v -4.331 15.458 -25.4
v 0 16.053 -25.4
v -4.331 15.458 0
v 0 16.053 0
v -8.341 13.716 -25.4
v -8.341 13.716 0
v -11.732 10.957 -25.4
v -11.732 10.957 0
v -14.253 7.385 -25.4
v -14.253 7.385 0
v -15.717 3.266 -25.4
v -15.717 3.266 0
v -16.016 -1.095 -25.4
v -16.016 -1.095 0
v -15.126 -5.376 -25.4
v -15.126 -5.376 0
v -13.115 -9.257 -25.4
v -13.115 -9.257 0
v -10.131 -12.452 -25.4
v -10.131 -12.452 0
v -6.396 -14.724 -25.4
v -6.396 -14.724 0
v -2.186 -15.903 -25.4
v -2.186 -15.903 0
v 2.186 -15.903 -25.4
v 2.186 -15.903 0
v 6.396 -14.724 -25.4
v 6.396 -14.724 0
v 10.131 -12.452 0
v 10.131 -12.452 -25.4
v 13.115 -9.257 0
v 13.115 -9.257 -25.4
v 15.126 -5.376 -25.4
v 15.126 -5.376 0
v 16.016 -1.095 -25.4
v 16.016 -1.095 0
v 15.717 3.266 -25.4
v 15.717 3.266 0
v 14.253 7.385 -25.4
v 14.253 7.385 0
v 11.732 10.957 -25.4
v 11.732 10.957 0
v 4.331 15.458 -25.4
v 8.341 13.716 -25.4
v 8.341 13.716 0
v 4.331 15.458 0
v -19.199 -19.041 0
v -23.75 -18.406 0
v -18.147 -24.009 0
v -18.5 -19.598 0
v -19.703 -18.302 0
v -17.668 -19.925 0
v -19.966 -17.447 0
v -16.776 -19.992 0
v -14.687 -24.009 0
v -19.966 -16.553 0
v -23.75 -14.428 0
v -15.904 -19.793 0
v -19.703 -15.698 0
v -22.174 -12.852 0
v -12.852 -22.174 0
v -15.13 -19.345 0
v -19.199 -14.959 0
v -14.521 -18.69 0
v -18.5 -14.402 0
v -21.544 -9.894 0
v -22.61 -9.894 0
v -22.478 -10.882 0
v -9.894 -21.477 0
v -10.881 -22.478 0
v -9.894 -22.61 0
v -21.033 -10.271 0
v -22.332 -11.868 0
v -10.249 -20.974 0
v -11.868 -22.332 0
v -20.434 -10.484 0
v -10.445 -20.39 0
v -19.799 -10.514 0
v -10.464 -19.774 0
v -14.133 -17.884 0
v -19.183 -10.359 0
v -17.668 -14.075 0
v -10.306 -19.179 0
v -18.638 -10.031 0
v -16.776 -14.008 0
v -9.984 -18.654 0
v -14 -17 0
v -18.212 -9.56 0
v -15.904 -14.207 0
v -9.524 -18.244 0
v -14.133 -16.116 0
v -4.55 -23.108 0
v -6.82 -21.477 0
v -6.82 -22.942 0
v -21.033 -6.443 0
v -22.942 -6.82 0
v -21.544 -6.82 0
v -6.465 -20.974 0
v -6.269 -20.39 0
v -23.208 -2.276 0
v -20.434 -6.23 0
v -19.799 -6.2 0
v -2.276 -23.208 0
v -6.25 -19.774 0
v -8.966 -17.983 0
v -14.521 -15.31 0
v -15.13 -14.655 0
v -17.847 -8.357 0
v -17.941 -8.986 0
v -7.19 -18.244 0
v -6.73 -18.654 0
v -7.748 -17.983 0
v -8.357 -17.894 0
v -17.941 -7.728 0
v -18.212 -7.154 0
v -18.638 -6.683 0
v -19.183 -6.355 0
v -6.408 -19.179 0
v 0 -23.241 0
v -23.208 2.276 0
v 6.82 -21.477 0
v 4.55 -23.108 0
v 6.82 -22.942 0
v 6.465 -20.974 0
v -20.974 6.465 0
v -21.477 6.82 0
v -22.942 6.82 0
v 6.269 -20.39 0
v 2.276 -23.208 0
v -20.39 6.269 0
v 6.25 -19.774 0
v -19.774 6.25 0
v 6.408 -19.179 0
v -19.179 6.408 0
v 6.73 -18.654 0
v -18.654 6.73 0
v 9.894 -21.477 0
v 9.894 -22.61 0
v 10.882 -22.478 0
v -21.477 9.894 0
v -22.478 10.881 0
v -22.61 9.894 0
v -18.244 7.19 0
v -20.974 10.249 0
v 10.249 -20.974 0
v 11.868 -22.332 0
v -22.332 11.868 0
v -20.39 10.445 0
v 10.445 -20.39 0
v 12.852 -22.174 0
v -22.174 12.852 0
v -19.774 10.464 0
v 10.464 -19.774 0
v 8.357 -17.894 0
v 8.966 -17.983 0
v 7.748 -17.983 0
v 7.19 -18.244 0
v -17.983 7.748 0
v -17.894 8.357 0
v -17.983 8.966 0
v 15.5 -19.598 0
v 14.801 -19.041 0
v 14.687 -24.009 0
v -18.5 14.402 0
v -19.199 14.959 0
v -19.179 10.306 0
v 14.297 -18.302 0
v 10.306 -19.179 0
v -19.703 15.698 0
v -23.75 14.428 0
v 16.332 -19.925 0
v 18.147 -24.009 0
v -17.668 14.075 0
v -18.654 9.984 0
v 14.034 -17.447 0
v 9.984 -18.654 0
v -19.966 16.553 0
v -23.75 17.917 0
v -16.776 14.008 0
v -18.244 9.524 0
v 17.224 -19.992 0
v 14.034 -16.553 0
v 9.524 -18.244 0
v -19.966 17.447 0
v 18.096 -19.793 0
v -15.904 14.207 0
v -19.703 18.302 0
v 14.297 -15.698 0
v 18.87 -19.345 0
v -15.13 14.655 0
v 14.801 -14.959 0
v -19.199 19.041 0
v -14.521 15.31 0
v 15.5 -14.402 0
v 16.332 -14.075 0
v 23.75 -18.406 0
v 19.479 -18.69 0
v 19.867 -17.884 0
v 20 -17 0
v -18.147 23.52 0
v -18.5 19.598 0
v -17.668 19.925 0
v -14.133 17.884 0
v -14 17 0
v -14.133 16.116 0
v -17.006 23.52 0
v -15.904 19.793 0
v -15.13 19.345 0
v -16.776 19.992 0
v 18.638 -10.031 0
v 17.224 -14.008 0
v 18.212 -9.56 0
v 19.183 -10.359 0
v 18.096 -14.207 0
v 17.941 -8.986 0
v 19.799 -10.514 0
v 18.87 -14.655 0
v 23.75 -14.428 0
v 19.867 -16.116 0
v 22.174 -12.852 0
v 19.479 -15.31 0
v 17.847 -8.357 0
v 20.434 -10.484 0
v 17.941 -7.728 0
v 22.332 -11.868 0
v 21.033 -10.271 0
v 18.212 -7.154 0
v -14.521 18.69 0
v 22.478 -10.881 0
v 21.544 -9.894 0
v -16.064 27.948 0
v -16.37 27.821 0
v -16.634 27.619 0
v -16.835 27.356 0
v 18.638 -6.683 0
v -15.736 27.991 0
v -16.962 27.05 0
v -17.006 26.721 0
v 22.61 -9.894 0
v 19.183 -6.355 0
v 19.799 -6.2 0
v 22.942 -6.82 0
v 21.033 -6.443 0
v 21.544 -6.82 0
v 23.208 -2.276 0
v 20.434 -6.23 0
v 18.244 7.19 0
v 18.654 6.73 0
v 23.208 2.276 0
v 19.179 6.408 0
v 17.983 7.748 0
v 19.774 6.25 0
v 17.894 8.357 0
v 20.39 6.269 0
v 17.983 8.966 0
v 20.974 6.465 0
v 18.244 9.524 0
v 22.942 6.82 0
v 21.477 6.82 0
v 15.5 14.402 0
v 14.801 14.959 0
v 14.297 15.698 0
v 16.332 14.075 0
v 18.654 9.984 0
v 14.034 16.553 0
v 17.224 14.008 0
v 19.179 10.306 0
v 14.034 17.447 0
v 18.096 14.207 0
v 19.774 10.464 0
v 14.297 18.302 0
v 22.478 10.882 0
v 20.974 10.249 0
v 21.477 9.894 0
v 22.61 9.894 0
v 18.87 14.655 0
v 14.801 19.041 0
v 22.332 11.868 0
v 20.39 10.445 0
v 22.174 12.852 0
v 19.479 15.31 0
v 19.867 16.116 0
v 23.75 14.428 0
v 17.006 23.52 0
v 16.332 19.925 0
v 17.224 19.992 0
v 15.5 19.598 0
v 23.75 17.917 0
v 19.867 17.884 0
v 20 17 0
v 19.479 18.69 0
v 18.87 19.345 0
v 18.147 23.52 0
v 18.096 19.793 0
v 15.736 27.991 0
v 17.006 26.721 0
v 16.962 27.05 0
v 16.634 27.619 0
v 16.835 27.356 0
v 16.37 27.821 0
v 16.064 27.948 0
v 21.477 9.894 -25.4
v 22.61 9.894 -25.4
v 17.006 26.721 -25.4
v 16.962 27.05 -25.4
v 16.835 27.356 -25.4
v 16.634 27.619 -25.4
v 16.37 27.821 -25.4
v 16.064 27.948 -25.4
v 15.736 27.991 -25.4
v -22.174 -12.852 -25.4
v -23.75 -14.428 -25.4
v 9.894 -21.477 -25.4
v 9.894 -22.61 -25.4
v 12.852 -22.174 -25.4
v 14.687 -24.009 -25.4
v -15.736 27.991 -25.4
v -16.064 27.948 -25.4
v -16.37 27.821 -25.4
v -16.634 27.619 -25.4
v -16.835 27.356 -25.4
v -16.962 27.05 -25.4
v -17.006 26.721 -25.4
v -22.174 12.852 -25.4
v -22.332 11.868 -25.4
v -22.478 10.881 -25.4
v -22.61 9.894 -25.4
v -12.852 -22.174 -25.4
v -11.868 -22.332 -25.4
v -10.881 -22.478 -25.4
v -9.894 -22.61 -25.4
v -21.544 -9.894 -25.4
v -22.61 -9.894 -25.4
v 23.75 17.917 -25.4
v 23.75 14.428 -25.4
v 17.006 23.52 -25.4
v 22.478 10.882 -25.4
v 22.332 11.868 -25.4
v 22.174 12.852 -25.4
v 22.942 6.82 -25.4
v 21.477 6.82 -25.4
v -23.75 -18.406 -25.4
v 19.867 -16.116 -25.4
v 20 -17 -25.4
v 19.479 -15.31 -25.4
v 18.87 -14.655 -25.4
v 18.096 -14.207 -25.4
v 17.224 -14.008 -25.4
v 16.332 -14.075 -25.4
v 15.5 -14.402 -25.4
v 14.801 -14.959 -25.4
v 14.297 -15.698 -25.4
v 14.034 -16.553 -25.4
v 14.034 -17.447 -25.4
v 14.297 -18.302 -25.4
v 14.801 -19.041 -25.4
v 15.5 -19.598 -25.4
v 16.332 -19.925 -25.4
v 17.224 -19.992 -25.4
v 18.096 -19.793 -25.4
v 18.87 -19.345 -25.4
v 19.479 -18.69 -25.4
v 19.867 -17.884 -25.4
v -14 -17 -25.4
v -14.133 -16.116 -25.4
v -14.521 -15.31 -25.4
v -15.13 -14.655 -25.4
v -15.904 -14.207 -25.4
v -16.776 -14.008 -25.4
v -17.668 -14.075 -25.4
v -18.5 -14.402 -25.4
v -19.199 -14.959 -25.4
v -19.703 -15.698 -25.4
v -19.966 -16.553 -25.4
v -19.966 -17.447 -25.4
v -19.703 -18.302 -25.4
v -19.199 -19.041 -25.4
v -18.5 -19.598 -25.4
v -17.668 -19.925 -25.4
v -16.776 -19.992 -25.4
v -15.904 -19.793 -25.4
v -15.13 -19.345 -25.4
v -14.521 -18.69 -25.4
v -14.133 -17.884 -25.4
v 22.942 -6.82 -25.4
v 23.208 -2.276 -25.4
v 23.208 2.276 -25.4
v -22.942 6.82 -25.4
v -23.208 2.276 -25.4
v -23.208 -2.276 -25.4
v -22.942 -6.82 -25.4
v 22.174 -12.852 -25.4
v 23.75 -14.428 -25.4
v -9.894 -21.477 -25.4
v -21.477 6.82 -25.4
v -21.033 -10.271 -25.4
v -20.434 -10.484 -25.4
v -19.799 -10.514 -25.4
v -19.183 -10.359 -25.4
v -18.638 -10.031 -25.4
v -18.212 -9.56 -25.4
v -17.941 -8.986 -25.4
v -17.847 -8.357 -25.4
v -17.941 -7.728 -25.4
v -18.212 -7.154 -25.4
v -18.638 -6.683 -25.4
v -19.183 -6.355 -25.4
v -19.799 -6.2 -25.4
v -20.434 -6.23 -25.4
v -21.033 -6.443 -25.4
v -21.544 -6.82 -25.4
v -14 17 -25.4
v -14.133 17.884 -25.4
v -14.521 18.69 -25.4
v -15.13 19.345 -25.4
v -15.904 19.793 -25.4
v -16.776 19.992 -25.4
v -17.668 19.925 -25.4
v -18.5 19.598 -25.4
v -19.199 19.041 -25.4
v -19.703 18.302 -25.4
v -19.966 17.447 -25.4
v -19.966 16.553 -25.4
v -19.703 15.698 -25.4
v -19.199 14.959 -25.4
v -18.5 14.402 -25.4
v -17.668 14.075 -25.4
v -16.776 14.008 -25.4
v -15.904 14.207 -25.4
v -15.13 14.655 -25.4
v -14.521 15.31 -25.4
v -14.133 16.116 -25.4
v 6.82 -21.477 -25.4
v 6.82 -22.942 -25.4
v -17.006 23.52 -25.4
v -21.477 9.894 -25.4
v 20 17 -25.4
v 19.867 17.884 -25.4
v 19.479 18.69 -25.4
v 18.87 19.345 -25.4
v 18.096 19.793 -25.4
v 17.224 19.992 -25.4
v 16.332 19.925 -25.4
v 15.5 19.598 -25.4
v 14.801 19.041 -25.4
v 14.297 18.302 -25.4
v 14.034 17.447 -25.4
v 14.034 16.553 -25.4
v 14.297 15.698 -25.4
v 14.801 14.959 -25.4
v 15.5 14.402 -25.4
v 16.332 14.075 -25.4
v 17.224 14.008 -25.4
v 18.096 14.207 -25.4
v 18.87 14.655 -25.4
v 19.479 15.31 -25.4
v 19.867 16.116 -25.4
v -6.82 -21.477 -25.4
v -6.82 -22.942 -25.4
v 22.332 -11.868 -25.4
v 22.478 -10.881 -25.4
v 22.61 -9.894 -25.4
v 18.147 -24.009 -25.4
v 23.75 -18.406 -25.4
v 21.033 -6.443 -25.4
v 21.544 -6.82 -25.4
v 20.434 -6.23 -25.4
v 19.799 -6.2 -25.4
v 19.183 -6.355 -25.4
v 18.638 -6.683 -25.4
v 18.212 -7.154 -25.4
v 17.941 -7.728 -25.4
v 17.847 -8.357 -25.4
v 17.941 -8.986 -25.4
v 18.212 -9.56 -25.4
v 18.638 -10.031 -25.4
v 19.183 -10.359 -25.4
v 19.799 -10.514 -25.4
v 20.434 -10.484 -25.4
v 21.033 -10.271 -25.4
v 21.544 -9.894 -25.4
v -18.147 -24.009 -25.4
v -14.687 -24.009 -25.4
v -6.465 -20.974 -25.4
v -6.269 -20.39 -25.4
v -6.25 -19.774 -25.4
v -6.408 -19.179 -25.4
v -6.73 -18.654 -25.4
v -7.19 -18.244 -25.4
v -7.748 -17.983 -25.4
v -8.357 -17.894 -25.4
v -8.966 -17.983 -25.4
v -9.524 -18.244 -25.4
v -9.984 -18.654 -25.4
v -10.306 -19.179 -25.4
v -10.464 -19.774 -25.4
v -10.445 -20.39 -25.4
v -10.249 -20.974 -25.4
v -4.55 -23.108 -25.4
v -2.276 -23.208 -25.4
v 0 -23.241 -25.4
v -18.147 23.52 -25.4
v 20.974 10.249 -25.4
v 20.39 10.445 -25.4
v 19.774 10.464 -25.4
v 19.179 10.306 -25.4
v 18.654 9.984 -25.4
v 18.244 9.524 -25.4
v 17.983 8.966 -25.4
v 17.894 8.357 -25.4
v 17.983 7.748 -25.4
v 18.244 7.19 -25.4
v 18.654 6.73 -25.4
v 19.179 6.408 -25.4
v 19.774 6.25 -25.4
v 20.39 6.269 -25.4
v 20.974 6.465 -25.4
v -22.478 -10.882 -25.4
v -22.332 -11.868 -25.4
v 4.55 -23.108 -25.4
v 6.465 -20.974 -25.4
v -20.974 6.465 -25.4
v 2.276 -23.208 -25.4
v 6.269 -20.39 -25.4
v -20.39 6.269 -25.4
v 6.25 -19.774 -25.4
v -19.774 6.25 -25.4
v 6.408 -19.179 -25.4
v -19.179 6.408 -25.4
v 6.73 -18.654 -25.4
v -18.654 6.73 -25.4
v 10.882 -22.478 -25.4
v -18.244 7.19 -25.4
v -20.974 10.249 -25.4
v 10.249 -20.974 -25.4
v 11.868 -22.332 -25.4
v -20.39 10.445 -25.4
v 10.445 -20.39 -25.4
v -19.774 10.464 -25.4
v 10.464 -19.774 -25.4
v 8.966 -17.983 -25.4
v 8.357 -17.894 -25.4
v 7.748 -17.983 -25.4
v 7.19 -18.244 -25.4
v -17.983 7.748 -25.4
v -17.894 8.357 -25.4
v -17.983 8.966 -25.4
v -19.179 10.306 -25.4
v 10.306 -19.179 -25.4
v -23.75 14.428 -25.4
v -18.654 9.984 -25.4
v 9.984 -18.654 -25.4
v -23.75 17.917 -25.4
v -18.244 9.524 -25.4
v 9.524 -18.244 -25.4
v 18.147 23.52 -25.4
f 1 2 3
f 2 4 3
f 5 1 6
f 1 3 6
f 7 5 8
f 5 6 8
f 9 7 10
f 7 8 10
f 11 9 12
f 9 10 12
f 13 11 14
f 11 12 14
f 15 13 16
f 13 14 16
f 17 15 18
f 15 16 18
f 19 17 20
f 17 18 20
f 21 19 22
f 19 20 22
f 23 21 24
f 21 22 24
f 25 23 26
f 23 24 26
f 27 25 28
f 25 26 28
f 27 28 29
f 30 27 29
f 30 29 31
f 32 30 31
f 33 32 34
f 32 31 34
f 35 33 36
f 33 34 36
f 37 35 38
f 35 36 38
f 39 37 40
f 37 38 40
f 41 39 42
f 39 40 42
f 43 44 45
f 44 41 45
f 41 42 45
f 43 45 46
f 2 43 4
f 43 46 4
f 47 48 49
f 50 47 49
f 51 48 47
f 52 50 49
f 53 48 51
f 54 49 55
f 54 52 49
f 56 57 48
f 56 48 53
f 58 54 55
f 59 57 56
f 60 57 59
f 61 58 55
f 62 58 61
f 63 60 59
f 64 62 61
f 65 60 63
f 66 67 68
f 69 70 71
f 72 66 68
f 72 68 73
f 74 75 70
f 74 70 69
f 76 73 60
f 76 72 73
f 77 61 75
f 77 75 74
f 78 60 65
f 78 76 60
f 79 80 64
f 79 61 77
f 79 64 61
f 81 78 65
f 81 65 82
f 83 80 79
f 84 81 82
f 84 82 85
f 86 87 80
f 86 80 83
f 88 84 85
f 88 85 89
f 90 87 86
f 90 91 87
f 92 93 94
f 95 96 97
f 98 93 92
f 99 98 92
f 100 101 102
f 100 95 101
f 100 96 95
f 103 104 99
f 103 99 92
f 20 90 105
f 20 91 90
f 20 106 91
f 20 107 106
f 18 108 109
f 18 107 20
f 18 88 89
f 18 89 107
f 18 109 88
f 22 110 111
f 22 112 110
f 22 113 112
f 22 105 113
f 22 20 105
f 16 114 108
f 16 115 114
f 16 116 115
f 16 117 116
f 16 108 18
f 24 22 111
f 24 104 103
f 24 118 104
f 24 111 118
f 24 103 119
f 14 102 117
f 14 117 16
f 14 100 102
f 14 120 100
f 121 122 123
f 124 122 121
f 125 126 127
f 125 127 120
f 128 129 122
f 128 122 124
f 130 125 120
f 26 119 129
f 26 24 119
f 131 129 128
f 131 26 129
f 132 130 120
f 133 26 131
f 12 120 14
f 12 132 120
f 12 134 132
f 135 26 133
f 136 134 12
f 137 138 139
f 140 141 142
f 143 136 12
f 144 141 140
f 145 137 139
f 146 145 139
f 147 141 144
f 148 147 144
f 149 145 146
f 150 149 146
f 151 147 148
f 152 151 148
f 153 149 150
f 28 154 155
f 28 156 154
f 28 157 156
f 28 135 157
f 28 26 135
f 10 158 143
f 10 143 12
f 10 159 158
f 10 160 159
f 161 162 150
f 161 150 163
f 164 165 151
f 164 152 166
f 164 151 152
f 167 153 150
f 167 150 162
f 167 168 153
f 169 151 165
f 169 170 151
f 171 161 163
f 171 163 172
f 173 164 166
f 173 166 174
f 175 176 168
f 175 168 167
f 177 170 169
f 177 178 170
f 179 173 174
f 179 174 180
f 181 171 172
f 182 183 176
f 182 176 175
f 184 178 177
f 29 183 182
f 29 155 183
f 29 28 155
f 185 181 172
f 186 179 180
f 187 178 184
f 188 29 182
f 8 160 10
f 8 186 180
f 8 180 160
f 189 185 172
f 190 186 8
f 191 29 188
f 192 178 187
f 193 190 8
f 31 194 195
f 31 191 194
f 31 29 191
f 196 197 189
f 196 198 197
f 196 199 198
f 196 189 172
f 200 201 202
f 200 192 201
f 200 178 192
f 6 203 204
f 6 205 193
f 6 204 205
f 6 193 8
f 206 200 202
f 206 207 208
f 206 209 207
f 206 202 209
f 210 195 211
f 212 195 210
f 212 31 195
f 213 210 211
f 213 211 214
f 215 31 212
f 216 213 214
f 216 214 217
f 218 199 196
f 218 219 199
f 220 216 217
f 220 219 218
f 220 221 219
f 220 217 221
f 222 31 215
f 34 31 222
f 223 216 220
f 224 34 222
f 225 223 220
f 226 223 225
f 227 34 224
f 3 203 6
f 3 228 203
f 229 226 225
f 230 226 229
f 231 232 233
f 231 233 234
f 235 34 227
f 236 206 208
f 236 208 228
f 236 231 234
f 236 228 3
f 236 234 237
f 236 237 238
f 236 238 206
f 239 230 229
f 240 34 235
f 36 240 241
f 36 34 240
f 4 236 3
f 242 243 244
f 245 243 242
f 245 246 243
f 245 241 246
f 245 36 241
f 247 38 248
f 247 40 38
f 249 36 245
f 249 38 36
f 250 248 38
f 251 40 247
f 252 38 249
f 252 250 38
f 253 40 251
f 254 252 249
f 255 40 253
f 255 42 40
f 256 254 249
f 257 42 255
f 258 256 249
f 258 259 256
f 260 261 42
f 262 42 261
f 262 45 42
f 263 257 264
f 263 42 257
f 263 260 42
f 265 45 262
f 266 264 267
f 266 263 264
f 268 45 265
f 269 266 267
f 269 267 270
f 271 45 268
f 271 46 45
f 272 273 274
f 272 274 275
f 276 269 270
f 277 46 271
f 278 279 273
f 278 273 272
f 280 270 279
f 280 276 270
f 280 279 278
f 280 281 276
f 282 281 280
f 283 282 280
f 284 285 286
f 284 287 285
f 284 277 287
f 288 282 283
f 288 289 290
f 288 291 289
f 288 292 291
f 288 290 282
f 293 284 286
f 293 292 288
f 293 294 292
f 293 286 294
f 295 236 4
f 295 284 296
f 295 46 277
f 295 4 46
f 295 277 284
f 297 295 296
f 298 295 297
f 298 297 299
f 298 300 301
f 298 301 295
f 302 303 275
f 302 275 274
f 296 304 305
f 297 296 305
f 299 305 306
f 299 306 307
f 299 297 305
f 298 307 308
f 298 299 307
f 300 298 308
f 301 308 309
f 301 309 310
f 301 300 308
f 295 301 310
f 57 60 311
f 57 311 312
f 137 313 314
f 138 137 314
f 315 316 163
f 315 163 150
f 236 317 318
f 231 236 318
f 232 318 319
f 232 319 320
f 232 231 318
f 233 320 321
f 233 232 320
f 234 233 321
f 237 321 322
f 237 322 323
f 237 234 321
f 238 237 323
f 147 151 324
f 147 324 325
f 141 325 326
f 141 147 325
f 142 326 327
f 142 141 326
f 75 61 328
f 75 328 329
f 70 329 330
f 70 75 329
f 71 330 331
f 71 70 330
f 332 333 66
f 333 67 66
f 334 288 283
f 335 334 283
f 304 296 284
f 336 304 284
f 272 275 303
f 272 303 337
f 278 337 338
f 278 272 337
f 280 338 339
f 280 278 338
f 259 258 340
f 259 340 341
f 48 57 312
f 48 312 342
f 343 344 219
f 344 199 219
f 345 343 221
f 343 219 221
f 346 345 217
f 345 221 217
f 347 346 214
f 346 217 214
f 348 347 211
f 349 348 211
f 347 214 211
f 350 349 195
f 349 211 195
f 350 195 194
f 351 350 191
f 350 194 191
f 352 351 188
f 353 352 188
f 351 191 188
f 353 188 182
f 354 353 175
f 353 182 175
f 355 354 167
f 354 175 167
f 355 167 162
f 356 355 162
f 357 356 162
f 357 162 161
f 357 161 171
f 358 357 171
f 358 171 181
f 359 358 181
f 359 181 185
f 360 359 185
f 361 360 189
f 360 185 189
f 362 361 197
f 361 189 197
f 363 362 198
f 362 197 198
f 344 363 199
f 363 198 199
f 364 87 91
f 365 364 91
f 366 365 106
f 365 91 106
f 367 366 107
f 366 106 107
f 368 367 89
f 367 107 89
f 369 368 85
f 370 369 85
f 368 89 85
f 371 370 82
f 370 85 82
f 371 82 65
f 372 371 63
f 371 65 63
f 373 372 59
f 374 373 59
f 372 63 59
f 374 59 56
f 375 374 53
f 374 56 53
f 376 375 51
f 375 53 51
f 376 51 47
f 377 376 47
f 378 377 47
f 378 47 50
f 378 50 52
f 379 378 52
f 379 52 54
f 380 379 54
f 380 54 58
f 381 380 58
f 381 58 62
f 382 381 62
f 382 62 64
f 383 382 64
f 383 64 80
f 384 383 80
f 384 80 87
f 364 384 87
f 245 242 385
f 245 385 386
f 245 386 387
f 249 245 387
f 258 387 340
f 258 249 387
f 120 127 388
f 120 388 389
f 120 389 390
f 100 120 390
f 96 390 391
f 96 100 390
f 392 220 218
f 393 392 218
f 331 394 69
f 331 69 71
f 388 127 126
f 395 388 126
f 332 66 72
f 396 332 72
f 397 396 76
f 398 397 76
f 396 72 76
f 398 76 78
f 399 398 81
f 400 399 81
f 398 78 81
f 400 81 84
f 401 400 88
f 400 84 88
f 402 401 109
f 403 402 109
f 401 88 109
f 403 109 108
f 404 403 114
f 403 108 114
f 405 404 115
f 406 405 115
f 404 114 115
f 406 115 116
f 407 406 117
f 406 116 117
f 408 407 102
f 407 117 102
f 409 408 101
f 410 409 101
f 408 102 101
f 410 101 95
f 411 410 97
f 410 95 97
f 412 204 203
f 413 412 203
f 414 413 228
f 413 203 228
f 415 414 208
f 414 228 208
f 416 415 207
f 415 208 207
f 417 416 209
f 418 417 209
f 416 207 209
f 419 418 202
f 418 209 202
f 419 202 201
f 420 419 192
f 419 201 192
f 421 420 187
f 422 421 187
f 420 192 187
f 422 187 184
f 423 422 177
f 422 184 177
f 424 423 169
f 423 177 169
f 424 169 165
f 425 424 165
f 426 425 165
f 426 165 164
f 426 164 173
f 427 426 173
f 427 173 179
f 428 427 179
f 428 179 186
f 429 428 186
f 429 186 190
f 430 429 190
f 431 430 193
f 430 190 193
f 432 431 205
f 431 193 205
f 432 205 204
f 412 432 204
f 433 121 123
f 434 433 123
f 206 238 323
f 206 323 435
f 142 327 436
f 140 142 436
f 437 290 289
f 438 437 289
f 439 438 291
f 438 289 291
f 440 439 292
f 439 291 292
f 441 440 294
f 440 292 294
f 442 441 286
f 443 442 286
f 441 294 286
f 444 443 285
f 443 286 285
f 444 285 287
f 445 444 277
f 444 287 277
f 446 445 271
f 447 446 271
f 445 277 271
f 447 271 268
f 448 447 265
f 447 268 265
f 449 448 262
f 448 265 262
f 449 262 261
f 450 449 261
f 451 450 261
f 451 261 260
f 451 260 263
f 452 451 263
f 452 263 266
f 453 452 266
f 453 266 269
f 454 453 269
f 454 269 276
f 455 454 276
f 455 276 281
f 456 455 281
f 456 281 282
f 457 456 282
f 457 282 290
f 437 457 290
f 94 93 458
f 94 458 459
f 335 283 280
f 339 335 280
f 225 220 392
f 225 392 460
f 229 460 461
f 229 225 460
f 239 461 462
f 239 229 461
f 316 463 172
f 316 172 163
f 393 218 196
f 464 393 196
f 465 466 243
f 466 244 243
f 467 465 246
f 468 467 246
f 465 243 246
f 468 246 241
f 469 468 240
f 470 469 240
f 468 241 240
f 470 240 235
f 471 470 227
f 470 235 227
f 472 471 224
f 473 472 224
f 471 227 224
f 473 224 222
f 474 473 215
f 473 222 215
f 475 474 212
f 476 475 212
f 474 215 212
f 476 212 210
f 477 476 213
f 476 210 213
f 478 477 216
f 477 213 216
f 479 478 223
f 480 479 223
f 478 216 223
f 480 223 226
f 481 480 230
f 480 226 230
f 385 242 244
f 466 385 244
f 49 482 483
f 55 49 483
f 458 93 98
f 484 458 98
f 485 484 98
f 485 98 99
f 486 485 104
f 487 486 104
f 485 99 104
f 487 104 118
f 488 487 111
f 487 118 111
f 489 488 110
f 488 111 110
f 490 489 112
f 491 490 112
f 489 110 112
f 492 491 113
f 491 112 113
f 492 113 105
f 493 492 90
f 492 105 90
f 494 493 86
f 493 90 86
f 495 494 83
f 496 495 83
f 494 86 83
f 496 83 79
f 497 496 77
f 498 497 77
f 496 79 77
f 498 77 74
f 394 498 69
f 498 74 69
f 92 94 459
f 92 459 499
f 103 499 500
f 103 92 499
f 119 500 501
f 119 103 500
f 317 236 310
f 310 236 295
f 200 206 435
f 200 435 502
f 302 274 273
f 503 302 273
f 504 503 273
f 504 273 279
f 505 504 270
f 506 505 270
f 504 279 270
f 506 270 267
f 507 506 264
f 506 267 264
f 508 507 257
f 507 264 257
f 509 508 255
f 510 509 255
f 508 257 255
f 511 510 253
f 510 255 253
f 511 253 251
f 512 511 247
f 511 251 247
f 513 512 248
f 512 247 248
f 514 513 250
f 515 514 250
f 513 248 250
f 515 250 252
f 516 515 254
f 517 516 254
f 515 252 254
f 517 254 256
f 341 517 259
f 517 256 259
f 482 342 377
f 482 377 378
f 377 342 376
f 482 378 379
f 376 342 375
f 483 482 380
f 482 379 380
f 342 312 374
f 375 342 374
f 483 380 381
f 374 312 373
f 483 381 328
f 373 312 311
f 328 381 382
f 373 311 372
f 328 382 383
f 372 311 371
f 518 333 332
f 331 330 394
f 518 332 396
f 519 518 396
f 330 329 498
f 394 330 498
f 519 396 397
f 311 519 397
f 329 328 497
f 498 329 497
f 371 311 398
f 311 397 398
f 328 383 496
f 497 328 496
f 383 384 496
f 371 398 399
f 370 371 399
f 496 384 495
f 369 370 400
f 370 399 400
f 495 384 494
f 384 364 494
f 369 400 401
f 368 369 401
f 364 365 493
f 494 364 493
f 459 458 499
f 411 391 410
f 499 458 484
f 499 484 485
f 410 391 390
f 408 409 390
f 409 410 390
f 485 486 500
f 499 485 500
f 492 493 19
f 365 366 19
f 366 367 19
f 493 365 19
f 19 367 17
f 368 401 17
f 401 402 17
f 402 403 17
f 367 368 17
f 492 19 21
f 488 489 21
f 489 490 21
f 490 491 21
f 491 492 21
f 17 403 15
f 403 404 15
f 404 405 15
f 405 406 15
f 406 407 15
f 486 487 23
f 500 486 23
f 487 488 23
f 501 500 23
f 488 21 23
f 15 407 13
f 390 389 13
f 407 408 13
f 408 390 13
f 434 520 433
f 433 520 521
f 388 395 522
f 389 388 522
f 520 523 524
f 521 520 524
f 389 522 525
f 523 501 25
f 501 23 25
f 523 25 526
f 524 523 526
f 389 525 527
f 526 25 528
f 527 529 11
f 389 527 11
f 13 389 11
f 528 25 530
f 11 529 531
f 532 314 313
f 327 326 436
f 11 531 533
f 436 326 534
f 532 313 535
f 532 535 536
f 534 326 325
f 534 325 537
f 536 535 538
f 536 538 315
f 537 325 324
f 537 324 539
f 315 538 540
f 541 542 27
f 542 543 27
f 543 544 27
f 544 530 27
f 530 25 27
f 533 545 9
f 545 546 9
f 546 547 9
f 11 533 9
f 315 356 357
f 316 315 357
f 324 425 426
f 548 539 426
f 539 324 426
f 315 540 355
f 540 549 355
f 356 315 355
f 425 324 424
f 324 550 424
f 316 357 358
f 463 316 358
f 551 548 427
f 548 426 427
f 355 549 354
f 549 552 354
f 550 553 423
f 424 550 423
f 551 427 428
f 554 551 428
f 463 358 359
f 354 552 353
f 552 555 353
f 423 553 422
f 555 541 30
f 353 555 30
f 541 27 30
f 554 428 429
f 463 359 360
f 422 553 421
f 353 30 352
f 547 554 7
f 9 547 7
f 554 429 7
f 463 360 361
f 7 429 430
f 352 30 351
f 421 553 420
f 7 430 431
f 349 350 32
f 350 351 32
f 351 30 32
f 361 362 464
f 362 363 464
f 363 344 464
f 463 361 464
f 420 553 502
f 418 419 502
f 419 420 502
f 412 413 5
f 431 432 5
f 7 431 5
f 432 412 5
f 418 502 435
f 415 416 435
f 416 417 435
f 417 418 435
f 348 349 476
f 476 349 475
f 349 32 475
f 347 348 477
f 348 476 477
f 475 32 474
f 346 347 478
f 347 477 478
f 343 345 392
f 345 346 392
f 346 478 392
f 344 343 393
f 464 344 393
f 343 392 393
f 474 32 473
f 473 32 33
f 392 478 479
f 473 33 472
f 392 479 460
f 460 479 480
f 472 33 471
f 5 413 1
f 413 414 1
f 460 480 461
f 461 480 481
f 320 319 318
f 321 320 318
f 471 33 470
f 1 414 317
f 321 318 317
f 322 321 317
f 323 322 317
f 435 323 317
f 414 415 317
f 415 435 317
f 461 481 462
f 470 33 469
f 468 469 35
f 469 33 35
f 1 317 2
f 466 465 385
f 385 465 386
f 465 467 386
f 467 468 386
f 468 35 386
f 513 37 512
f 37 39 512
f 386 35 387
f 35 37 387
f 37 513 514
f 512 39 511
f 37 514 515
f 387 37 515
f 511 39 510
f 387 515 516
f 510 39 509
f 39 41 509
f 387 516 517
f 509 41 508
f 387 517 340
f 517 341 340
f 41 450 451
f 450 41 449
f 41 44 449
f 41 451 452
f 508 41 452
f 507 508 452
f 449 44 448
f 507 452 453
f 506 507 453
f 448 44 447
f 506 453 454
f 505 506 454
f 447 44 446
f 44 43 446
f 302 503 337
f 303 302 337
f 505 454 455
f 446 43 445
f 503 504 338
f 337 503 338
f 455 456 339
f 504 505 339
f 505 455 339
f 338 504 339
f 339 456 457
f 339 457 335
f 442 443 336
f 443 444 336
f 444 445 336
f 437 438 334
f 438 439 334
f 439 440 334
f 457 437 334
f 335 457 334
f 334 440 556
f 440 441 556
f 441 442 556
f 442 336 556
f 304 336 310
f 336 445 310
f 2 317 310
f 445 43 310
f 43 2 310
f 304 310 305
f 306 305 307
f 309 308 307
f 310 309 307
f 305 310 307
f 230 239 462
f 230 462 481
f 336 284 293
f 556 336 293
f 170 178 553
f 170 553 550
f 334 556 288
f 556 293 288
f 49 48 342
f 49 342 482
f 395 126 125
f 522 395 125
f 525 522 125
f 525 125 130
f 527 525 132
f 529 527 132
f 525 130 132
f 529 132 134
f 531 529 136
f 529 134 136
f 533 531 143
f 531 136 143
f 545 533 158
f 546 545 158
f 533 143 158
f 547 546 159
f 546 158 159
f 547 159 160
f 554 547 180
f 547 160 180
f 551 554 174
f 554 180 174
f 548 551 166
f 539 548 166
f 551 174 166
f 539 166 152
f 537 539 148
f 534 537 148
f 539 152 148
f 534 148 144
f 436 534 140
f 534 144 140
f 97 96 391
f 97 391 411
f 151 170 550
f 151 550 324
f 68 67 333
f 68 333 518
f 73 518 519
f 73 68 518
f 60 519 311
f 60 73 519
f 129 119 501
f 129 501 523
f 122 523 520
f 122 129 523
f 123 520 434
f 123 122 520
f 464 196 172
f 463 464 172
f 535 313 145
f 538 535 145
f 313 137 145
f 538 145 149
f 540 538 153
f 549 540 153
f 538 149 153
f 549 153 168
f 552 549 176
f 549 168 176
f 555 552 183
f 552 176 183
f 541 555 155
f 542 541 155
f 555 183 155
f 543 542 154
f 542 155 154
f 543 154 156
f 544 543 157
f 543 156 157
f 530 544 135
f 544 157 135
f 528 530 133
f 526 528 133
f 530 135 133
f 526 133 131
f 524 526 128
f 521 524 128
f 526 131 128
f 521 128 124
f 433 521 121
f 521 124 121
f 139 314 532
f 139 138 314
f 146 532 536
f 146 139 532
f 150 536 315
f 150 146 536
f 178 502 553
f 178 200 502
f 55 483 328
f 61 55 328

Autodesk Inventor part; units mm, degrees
ref_plane "YZ Plane" through (0, 0, 0) normal (1, 0, 0) x (0, 1, 0)
ref_plane "XZ Plane" through (0, 0, 0) normal (0, 1, 0) x (-1, 0, 0)
ref_plane "XY Plane" through (0, 0, 0) normal (0, 0, 1) x (1, 0, 0)
sketch "Sketch1" plane through (0, 0, 0) normal (0, 0, 1) x (1, 0, 0)
  arc A0 (0, 16.053) -> (0, -16.053) centre (0, 0) ccw
  arc A1 (-15.7355, 27.991) -> (-17.0055, 26.721) centre (-15.7355, 26.721) ccw
  line L0 (-17.0055, 26.721) -> (-17.0055, 23.52)
  line L1 (-17.0055, 23.52) -> (-18.1469, 23.52)
  line L2 (0, 78.3044) -> (0, -31.8793) projected
  line L3 (-15.7355, 27.991) -> (0, 27.991)
  line L4 (-18.1469, 23.52) -> (-23.75, 17.9169)
  line L5 (-23.75, 17.9169) -> (-23.75, 14.428)
  line L6 (-23.75, 14.428) -> (-22.174, 12.852)
  line L7 (-22.6105, 9.8935) -> (-21.4771, 9.8935)
  arc A2 (-21.4771, 6.8205) -> (-21.4771, 9.8935) centre (-20.015, 8.357) ccw
  line L8 (-22.942, 6.8205) -> (-21.4771, 6.8205)
  arc A3 (-22.174, 12.852) -> (-22.6105, 9.8935) centre (54.6936, 0) ccw
  arc A4 (-21.544, -9.8935) -> (-21.544, -6.8205) centre (-20.015, -8.357) ccw
  line L9 (-22.942, -6.8205) -> (-21.544, -6.8205)
  line L10 (-22.6105, -9.8935) -> (-21.544, -9.8935)
  arc A5 (-22.942, 6.8205) -> (-22.942, -6.8205) centre (54.6936, 0) ccw
  arc A6 (-22.6105, -9.8935) -> (-22.174, -12.852) centre (54.6936, 0) ccw
  line L11 (-22.174, -12.852) -> (-23.75, -14.428)
  line L12 (-23.75, -14.428) -> (-23.75, -18.4059)
  line L13 (-23.75, -18.4059) -> (-18.1469, -24.009)
  line L14 (-18.1469, -24.009) -> (-14.687, -24.009)
  line L15 (-14.687, -24.009) -> (-12.852, -22.174)
  arc A7 (-6.8205, -21.4771) -> (-9.8935, -21.4771) centre (-8.357, -20.015) ccw
  line L16 (-9.8935, -21.4771) -> (-9.8935, -22.6105)
  line L17 (-6.8205, -21.4771) -> (-6.8205, -22.942)
  arc A8 (-12.852, -22.174) -> (-9.8935, -22.6105) centre (0, 54.6936) ccw
  arc A9 (-6.8205, -22.942) -> (0, -23.241) centre (0, 54.6936) ccw
  circle A10 centre (-17, -17) radius 3
  circle A11 centre (-17, 17) radius 3
  arc A12 (0, -16.053) -> (0, 16.053) centre (0, 0) ccw
  arc A13 (17.0055, 26.721) -> (15.7355, 27.991) centre (15.7355, 26.721) ccw
  line L18 (17.0055, 26.721) -> (17.0055, 23.52)
  line L19 (17.0055, 23.52) -> (18.1469, 23.52)
  line L20 (15.7355, 27.991) -> (0, 27.991)
  line L21 (18.1469, 23.52) -> (23.75, 17.9169)
  line L22 (23.75, 17.9169) -> (23.75, 14.428)
  line L23 (23.75, 14.428) -> (22.174, 12.852)
  line L24 (22.6105, 9.8935) -> (21.4771, 9.8935)
  arc A14 (21.4771, 9.8935) -> (21.4771, 6.8205) centre (20.015, 8.357) ccw
  line L25 (22.942, 6.8205) -> (21.4771, 6.8205)
  arc A15 (22.6105, 9.8935) -> (22.174, 12.852) centre (-54.6936, 0) ccw
  arc A16 (21.544, -6.8205) -> (21.544, -9.8935) centre (20.015, -8.357) ccw
  line L26 (22.942, -6.8205) -> (21.544, -6.8205)
  line L27 (22.6105, -9.8935) -> (21.544, -9.8935)
  arc A17 (22.942, -6.8205) -> (22.942, 6.8205) centre (-54.6936, 0) ccw
  arc A18 (22.174, -12.852) -> (22.6105, -9.8935) centre (-54.6936, 0) ccw
  line L28 (22.174, -12.852) -> (23.75, -14.428)
  line L29 (23.75, -14.428) -> (23.75, -18.4059)
  line L30 (23.75, -18.4059) -> (18.1469, -24.009)
  line L31 (18.1469, -24.009) -> (14.687, -24.009)
  line L32 (14.687, -24.009) -> (12.852, -22.174)
  arc A19 (9.8935, -21.4771) -> (6.8205, -21.4771) centre (8.357, -20.015) ccw
  line L33 (9.8935, -21.4771) -> (9.8935, -22.6105)
  line L34 (6.8205, -21.4771) -> (6.8205, -22.942)
  arc A20 (9.8935, -22.6105) -> (12.852, -22.174) centre (0, 54.6936) ccw
  arc A21 (0, -23.241) -> (6.8205, -22.942) centre (0, 54.6936) ccw
  circle A22 centre (17, -17) radius 3
  circle A23 centre (17, 17) radius 3
  arc A24 (22.174, -12.852) -> (22.6105, -9.8935) centre (-54.6936, 0) ccw
  arc A25 (22.942, -6.8205) -> (22.942, 6.8205) centre (-54.6936, 0) ccw
  dimension "d0" = 54.6936
  dimension "d2" = 54.6936
  dimension "d6" = 32.106
  dimension "d8" = 2.54
  dimension "d10" = 15.7355
  dimension "d11" = 26.721
  dimension "d12" = 18.1469
  dimension "d13" = 23.52
  dimension "d14" = 135
  dimension "d15" = 17.9169
  dimension "d16" = 3.4889
  dimension "d17" = 135
  dimension "d18" = 22.174
  dimension "d19" = 9.8935
  dimension "d22" = 22.6105
  dimension "d23" = 20.015
  dimension "d24" = 8.357
  dimension "d25" = 4.242
  dimension "d26" = 6.8205
  dimension "d27" = 8.357
  dimension "d28" = 4.3354
  dimension "d29" = 6.8205
  dimension "d30" = 9.8935
  dimension "d31" = 77.9346
  dimension "d32" = 22.174
  dimension "d33" = 12.852
  dimension "d34" = 45
  dimension "d35" = 14.428
  dimension "d37" = 18.4059
  dimension "d38" = 135
  dimension "d39" = 24.009
  dimension "d41" = 135
  dimension "d42" = 14.687
  dimension "d43" = 20.015
  dimension "d44" = 8.357
  dimension "d45" = 4.242
  dimension "d46" = 9.8935
  dimension "d47" = 6.8205
  dimension "d48" = 77.9346
  dimension "d49" = 77.9346
  dimension "d50" = 17
  dimension "d51" = 17
  dimension "d52" = 6
  dimension "d53" = 17
  dimension "d54" = 6
extrude "PHD, 32MM" add sketch "Sketch1" against normal blind 25.4 contours A0 L2 A9 L17 A7 L16 A8 L15 L14 L13 L12 L11 A6 L10 A4 L9 A5 L8 A2 L7 A3 L6 L5 L4 L1 L0 A1 L3 | L2 L20 A13 L18 L19 L21 L22 L23 A15 L24 A14 L25 A17 L26 A16 L27 A18 L28 L29 L30 L31 L32 A20 L33 A19 L34 A21 A12
equation "\"d27\" = d24"
equation "\"d29\" = d26"
equation "\"d30\" = d19"
equation "\"d53\" = d51"
equation "\"d54\" = d52"
properties part number "EXTRUSION, CYLINDER, ALUMINIUM, PHD, 32MM" material "Extrusion, Aluminum, PHD, 32MM"
